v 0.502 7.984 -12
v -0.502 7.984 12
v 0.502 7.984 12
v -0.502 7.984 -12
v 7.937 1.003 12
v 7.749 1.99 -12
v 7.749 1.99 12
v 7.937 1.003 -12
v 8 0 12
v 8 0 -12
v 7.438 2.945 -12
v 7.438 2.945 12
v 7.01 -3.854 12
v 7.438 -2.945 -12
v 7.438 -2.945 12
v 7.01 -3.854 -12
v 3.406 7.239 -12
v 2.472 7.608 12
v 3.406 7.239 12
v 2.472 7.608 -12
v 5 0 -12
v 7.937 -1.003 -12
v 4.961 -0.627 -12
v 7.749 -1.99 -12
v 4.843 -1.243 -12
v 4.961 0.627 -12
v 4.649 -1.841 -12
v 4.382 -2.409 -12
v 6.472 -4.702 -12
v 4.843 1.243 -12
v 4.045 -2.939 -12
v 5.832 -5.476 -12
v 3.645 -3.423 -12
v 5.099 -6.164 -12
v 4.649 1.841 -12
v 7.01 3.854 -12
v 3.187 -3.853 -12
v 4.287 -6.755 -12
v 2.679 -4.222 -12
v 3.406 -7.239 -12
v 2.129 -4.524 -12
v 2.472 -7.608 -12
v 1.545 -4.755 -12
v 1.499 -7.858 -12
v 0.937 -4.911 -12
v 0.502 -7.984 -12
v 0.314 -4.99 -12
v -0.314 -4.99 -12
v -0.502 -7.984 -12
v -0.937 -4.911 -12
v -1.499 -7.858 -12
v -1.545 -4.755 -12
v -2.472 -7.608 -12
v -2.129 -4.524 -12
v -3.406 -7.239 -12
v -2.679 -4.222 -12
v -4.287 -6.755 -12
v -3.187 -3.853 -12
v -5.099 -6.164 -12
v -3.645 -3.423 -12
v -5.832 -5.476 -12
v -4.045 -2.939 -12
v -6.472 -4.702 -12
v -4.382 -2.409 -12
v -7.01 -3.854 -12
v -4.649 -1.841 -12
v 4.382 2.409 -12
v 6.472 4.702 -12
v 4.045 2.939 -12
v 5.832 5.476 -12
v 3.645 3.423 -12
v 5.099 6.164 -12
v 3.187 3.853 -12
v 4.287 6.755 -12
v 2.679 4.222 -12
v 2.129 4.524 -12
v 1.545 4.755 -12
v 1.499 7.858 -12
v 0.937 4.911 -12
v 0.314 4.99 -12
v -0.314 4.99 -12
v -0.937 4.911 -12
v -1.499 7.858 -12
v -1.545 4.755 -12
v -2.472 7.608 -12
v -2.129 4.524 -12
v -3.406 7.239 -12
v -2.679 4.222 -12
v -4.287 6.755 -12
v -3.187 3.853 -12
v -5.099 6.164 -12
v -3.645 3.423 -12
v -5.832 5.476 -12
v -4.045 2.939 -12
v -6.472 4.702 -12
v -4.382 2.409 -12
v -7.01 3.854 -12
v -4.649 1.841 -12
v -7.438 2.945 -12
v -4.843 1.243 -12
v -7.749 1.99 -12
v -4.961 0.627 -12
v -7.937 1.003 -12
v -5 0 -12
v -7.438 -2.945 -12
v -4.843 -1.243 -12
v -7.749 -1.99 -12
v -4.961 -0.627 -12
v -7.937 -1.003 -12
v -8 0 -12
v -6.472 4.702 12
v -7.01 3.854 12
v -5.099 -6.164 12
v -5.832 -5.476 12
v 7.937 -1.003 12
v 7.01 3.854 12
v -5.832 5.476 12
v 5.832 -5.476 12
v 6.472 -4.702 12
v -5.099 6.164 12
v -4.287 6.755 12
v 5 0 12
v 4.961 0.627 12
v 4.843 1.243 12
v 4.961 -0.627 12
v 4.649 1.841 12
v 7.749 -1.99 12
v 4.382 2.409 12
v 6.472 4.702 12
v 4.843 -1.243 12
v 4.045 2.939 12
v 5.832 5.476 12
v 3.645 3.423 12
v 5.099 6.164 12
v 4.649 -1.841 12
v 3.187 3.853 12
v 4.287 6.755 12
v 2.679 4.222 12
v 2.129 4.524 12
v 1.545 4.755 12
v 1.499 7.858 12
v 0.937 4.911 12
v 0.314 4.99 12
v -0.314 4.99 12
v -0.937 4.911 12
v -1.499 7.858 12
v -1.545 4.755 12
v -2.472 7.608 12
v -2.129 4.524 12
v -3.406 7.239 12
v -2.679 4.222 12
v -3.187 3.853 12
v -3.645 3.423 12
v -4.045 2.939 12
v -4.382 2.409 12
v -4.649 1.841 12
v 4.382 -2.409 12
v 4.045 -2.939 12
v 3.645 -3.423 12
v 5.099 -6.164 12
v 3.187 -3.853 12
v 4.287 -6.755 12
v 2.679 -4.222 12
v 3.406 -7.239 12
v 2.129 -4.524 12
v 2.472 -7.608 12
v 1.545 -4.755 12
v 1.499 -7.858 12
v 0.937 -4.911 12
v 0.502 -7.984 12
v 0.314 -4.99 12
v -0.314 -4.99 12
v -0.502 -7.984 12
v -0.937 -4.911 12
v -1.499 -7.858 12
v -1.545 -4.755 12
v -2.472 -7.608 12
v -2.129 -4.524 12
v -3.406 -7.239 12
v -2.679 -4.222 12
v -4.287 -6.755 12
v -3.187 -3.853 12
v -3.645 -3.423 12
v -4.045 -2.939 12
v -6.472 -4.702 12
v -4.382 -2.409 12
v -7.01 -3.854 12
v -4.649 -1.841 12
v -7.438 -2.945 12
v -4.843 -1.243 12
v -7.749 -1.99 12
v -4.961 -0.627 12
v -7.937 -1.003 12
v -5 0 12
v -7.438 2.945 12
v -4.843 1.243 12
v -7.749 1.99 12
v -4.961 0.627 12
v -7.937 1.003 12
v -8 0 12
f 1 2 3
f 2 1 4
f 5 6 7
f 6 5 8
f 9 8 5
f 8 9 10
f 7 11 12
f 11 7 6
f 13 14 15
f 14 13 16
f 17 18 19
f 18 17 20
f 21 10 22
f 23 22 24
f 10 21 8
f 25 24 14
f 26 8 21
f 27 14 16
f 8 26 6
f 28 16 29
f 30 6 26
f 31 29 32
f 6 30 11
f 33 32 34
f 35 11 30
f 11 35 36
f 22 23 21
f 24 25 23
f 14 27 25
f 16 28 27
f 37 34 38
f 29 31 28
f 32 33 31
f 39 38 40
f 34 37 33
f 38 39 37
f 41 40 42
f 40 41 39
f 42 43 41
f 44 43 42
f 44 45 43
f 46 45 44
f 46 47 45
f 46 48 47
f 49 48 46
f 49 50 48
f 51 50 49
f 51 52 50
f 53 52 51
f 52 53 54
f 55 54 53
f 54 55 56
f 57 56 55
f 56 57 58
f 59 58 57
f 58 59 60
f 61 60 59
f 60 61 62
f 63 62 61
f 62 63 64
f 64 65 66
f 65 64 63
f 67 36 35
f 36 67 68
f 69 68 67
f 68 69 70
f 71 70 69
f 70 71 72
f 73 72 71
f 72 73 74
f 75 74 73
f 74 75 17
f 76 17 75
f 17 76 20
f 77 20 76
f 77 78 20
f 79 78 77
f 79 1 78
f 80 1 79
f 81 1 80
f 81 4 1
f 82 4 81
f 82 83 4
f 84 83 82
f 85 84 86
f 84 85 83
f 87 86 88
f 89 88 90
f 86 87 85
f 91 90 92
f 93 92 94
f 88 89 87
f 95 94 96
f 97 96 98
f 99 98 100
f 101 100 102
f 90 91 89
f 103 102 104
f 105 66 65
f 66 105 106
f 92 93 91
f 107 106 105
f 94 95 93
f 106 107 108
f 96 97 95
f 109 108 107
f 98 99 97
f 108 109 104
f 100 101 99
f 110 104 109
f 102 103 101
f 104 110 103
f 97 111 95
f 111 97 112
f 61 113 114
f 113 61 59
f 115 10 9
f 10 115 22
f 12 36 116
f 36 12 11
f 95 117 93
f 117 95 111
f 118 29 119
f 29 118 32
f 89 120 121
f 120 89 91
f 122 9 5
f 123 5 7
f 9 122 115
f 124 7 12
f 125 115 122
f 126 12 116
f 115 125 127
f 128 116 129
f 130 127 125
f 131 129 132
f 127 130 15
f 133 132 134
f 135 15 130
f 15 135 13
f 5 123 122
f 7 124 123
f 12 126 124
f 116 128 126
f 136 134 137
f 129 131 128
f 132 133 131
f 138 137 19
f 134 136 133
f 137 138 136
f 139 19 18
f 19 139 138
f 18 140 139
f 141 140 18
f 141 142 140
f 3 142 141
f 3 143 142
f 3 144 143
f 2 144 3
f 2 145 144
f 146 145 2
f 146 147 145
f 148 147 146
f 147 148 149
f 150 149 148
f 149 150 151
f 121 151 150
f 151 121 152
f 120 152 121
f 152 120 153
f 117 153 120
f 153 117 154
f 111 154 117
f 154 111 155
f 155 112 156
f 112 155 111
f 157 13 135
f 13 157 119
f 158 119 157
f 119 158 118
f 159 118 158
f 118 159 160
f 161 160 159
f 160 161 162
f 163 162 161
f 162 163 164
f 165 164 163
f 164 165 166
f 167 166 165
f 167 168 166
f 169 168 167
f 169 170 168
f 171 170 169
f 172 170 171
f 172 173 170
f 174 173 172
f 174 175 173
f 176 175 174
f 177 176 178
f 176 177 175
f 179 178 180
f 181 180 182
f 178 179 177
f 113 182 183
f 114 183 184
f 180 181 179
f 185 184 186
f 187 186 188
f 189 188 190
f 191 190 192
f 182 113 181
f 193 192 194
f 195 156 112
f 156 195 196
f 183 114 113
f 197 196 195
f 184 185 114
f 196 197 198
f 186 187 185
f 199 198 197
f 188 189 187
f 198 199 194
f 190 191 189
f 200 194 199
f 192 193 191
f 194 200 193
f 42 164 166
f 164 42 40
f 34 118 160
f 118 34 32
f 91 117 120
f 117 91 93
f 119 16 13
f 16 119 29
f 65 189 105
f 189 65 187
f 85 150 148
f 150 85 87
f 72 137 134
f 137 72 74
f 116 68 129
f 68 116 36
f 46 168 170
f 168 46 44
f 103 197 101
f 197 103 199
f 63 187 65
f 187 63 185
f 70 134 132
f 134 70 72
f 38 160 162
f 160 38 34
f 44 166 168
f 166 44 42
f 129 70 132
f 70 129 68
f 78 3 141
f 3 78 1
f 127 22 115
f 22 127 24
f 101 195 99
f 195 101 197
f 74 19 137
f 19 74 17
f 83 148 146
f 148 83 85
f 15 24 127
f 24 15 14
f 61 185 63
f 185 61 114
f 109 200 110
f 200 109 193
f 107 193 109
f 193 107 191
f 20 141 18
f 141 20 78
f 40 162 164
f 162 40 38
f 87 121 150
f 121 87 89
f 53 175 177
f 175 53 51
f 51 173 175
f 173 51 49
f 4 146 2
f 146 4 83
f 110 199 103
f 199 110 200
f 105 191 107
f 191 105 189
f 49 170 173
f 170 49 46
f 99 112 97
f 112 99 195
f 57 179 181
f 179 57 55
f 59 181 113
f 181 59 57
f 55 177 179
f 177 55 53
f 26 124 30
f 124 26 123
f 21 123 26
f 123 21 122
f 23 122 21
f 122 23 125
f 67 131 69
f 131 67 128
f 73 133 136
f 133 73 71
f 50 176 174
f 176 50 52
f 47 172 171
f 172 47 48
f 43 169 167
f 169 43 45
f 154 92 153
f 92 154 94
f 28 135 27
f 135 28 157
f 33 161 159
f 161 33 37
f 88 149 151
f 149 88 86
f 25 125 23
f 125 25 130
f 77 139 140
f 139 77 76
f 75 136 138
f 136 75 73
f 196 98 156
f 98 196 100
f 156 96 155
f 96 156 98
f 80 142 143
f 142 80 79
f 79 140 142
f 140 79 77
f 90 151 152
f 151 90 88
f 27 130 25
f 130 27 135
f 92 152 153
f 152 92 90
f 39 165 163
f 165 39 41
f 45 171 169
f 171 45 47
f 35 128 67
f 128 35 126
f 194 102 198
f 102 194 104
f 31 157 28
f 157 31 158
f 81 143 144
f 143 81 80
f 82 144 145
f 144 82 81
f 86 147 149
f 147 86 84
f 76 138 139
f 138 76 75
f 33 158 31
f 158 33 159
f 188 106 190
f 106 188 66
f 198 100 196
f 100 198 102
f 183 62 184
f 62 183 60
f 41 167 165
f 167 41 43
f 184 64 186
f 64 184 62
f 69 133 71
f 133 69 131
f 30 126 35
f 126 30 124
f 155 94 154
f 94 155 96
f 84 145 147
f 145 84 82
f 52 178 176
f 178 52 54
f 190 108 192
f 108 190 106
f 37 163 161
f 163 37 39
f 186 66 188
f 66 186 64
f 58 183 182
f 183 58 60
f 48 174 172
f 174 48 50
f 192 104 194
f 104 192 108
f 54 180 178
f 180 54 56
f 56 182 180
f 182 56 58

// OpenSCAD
$fn = 50;


difference() {
	union() {
		translate(v = [0, 0, -12.0000000000]) {
			cylinder(h = 24, r = 8.0000000000);
		}
	}
	union() {
		translate(v = [0, 0, -100.0000000000]) {
			cylinder(h = 200, r = 5.0000000000);
		}
	}
}
